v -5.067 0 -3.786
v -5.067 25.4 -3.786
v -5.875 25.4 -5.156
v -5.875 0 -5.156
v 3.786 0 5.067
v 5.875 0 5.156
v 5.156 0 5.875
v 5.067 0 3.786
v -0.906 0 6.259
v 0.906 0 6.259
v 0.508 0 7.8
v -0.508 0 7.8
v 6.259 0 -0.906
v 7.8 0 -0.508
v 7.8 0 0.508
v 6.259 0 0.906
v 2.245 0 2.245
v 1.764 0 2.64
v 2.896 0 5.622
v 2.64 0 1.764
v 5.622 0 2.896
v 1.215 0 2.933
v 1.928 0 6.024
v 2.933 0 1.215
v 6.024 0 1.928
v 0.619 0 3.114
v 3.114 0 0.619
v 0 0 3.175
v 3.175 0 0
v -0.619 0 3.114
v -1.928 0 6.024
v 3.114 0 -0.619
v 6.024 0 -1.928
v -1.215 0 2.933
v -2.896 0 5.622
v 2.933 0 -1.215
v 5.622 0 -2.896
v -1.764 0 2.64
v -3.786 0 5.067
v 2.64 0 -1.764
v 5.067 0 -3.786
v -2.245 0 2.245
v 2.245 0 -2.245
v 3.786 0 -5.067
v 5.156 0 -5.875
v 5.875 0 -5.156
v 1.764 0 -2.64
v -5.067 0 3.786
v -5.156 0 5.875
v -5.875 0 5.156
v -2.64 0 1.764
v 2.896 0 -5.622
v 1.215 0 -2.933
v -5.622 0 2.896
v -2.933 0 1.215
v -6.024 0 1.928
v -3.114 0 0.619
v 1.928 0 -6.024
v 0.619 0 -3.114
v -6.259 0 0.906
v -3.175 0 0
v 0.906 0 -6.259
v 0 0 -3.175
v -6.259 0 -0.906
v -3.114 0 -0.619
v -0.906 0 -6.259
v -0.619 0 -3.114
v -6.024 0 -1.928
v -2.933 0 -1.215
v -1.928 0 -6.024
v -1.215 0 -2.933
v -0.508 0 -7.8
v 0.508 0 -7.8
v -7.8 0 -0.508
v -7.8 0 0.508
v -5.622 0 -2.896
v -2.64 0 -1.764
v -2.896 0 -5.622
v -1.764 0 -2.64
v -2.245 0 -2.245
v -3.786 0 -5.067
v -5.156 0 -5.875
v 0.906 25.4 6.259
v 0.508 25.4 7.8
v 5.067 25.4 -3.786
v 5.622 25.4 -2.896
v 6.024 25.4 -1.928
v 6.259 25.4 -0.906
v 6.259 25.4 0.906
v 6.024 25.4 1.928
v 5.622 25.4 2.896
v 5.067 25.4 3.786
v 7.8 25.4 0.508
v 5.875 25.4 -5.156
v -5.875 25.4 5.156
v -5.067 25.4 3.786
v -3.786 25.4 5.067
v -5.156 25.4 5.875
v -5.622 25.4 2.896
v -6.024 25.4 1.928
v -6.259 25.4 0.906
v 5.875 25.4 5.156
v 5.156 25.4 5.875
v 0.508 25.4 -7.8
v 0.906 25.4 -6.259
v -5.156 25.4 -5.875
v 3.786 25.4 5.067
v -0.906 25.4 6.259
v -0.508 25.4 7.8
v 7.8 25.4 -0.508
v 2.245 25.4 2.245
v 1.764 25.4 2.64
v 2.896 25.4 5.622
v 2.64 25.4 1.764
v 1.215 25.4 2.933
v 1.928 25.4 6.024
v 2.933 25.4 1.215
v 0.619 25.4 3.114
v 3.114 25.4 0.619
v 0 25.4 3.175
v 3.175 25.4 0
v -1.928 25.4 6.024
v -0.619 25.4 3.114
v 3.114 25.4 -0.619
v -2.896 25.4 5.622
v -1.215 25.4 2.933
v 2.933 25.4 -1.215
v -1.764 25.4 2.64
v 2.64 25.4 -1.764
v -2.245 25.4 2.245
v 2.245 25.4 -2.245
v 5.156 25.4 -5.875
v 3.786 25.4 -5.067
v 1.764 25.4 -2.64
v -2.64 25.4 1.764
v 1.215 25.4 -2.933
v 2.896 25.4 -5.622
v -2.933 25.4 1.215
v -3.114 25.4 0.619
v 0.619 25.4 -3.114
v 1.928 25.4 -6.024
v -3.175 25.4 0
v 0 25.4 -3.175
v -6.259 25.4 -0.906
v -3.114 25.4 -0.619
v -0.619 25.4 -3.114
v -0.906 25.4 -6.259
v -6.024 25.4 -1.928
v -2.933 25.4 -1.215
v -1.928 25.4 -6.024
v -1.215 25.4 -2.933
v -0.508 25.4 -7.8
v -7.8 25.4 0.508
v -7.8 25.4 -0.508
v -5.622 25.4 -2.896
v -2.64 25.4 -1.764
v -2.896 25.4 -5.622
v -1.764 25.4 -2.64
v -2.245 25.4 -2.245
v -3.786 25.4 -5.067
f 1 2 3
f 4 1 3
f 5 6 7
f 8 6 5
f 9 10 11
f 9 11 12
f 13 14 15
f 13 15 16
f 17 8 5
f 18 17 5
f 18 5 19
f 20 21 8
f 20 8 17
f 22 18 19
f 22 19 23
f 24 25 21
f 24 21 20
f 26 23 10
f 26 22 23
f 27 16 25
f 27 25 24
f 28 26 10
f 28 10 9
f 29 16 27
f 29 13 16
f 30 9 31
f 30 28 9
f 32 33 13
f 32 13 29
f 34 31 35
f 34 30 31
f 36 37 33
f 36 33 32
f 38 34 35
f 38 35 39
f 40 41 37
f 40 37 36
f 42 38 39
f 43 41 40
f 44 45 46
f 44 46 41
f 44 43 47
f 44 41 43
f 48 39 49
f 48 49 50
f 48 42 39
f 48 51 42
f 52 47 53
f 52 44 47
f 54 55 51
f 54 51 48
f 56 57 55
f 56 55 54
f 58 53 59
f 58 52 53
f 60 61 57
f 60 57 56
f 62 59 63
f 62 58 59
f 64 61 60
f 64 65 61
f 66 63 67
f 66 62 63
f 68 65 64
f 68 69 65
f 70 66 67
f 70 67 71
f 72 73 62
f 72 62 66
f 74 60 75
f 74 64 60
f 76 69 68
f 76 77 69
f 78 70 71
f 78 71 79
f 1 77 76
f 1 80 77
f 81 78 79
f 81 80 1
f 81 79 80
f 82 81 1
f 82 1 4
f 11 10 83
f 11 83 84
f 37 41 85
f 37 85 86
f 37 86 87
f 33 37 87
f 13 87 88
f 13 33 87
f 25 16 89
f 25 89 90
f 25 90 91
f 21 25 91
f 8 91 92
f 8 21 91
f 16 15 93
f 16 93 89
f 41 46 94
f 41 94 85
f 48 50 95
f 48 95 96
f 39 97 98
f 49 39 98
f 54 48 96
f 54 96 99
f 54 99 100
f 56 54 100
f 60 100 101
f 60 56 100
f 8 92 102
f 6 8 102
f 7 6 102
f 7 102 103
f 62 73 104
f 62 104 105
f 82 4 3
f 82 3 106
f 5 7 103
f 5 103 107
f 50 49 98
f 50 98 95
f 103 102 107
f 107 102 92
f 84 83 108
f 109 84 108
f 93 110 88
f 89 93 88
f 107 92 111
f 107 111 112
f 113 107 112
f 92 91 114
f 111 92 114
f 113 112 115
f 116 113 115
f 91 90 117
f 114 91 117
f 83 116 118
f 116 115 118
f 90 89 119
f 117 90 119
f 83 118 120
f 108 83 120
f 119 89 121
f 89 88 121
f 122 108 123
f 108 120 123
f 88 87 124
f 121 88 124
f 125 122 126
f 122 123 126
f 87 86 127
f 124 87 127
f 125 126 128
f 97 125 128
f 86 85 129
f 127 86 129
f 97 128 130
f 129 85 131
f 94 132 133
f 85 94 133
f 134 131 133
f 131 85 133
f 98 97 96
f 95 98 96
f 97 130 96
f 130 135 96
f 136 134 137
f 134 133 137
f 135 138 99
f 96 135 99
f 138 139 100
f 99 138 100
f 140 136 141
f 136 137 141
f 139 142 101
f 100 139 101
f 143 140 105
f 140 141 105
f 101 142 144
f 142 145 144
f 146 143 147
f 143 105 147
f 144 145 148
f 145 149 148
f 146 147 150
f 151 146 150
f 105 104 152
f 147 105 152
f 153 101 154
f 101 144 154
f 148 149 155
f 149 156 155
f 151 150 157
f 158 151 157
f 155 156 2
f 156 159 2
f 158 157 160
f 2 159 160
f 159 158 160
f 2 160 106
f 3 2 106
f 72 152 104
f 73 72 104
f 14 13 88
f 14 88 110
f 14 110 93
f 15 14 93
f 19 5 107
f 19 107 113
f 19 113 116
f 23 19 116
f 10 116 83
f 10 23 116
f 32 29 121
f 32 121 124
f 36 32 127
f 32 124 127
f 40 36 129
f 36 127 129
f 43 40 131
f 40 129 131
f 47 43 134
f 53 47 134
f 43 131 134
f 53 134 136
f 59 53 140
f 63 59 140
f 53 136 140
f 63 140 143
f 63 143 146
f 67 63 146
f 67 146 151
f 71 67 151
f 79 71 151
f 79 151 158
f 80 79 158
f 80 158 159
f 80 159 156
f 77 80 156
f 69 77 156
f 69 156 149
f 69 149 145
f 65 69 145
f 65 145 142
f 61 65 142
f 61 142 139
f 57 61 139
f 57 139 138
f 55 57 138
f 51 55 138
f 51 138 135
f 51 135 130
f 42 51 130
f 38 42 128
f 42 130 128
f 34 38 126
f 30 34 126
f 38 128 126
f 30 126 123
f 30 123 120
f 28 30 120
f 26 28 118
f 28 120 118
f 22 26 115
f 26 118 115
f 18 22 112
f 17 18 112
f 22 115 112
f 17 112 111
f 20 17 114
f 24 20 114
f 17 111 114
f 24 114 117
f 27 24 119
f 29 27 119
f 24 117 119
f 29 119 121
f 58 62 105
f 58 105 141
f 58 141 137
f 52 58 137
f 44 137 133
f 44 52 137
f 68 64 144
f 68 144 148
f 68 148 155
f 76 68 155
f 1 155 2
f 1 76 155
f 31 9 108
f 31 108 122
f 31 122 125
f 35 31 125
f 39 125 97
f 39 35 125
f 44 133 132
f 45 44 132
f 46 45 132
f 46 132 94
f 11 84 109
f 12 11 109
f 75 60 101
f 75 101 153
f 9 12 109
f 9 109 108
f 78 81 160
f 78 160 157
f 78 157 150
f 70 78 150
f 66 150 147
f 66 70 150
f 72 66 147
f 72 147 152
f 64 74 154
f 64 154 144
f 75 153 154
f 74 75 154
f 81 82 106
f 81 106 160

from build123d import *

# Parameters (mm, degrees)
BOSS_EXTRUDE4_DEPTH = 25.4
SKETCH9_R           = 3.175
CUT_EXTRUDE3_DEPTH  = 30.48


with BuildPart() as part:
    # Sketch8 → Boss-Extrude4 (new body)
    with BuildSketch(Plane(origin=(0, 0, 0), x_dir=(1, 0, 0), z_dir=(0, 1, 0))):
        with BuildLine():
            Line((-0.905835842, 6.259395066), (-0.508, 7.800206655))
            Line((-0.508, 7.800206655), (0.508, 7.800206655))
            Line((0.508, 7.800206655), (0.905835842, 6.259395066))
            ThreePointArc((0.905835842, 6.259395066), (2.420319636, 5.843168491), (3.785538031, 5.066583363))
            Line((3.785538031, 5.066583363), (5.156368775, 5.874789265))
            Line((5.156368775, 5.874789265), (5.874789265, 5.156368775))
            Line((5.874789265, 5.156368775), (5.066583363, 3.785538031))
            ThreePointArc((5.066583363, 3.785538031), (5.843168491, 2.420319636), (6.259395066, 0.905835842))
            Line((6.259395066, 0.905835842), (7.800206655, 0.508))
            Line((7.800206655, 0.508), (7.800206655, -0.508))
            Line((7.800206655, -0.508), (6.259395066, -0.905835842))
            ThreePointArc((6.259395066, -0.905835842), (5.843168491, -2.420319636), (5.066583363, -3.785538031))
            Line((5.066583363, -3.785538031), (5.874789265, -5.156368775))
            Line((5.874789265, -5.156368775), (5.156368775, -5.874789265))
            Line((5.156368775, -5.874789265), (3.785538031, -5.066583363))
            ThreePointArc((3.785538031, -5.066583363), (2.420319636, -5.843168491), (0.905835842, -6.259395066))
            Line((0.905835842, -6.259395066), (0.508, -7.800206655))
            Line((0.508, -7.800206655), (-0.508, -7.800206655))
            Line((-0.508, -7.800206655), (-0.905835842, -6.259395066))
            ThreePointArc((-0.905835842, -6.259395066), (-2.420319636, -5.843168491), (-3.785538031, -5.066583363))
            Line((-3.785538031, -5.066583363), (-5.156368775, -5.874789265))
            Line((-5.156368775, -5.874789265), (-5.874789265, -5.156368775))
            Line((-5.874789265, -5.156368775), (-5.066583363, -3.785538031))
            ThreePointArc((-5.066583363, -3.785538031), (-5.843168491, -2.420319636), (-6.259395066, -0.905835842))
            Line((-6.259395066, -0.905835842), (-7.800206655, -0.508))
            Line((-7.800206655, -0.508), (-7.800206655, 0.508))
            Line((-7.800206655, 0.508), (-6.259395066, 0.905835842))
            ThreePointArc((-6.259395066, 0.905835842), (-5.843168491, 2.420319636), (-5.066583363, 3.785538031))
            Line((-5.066583363, 3.785538031), (-5.874789265, 5.156368775))
            Line((-5.874789265, 5.156368775), (-5.156368775, 5.874789265))
            Line((-5.156368775, 5.874789265), (-3.785538031, 5.066583363))
            ThreePointArc((-3.785538031, 5.066583363), (-2.420319636, 5.843168491), (-0.905835842, 6.259395066))
        make_face()
    extrude(amount=BOSS_EXTRUDE4_DEPTH)

    # Sketch9 → Cut-Extrude3 (cut)
    with BuildSketch(Plane(origin=(0, 25.4, 0), x_dir=(1, 0, 0), z_dir=(0, 1, 0))):
        Circle(SKETCH9_R)
    extrude(amount=-CUT_EXTRUDE3_DEPTH, mode=Mode.SUBTRACT)


solid = part.part
